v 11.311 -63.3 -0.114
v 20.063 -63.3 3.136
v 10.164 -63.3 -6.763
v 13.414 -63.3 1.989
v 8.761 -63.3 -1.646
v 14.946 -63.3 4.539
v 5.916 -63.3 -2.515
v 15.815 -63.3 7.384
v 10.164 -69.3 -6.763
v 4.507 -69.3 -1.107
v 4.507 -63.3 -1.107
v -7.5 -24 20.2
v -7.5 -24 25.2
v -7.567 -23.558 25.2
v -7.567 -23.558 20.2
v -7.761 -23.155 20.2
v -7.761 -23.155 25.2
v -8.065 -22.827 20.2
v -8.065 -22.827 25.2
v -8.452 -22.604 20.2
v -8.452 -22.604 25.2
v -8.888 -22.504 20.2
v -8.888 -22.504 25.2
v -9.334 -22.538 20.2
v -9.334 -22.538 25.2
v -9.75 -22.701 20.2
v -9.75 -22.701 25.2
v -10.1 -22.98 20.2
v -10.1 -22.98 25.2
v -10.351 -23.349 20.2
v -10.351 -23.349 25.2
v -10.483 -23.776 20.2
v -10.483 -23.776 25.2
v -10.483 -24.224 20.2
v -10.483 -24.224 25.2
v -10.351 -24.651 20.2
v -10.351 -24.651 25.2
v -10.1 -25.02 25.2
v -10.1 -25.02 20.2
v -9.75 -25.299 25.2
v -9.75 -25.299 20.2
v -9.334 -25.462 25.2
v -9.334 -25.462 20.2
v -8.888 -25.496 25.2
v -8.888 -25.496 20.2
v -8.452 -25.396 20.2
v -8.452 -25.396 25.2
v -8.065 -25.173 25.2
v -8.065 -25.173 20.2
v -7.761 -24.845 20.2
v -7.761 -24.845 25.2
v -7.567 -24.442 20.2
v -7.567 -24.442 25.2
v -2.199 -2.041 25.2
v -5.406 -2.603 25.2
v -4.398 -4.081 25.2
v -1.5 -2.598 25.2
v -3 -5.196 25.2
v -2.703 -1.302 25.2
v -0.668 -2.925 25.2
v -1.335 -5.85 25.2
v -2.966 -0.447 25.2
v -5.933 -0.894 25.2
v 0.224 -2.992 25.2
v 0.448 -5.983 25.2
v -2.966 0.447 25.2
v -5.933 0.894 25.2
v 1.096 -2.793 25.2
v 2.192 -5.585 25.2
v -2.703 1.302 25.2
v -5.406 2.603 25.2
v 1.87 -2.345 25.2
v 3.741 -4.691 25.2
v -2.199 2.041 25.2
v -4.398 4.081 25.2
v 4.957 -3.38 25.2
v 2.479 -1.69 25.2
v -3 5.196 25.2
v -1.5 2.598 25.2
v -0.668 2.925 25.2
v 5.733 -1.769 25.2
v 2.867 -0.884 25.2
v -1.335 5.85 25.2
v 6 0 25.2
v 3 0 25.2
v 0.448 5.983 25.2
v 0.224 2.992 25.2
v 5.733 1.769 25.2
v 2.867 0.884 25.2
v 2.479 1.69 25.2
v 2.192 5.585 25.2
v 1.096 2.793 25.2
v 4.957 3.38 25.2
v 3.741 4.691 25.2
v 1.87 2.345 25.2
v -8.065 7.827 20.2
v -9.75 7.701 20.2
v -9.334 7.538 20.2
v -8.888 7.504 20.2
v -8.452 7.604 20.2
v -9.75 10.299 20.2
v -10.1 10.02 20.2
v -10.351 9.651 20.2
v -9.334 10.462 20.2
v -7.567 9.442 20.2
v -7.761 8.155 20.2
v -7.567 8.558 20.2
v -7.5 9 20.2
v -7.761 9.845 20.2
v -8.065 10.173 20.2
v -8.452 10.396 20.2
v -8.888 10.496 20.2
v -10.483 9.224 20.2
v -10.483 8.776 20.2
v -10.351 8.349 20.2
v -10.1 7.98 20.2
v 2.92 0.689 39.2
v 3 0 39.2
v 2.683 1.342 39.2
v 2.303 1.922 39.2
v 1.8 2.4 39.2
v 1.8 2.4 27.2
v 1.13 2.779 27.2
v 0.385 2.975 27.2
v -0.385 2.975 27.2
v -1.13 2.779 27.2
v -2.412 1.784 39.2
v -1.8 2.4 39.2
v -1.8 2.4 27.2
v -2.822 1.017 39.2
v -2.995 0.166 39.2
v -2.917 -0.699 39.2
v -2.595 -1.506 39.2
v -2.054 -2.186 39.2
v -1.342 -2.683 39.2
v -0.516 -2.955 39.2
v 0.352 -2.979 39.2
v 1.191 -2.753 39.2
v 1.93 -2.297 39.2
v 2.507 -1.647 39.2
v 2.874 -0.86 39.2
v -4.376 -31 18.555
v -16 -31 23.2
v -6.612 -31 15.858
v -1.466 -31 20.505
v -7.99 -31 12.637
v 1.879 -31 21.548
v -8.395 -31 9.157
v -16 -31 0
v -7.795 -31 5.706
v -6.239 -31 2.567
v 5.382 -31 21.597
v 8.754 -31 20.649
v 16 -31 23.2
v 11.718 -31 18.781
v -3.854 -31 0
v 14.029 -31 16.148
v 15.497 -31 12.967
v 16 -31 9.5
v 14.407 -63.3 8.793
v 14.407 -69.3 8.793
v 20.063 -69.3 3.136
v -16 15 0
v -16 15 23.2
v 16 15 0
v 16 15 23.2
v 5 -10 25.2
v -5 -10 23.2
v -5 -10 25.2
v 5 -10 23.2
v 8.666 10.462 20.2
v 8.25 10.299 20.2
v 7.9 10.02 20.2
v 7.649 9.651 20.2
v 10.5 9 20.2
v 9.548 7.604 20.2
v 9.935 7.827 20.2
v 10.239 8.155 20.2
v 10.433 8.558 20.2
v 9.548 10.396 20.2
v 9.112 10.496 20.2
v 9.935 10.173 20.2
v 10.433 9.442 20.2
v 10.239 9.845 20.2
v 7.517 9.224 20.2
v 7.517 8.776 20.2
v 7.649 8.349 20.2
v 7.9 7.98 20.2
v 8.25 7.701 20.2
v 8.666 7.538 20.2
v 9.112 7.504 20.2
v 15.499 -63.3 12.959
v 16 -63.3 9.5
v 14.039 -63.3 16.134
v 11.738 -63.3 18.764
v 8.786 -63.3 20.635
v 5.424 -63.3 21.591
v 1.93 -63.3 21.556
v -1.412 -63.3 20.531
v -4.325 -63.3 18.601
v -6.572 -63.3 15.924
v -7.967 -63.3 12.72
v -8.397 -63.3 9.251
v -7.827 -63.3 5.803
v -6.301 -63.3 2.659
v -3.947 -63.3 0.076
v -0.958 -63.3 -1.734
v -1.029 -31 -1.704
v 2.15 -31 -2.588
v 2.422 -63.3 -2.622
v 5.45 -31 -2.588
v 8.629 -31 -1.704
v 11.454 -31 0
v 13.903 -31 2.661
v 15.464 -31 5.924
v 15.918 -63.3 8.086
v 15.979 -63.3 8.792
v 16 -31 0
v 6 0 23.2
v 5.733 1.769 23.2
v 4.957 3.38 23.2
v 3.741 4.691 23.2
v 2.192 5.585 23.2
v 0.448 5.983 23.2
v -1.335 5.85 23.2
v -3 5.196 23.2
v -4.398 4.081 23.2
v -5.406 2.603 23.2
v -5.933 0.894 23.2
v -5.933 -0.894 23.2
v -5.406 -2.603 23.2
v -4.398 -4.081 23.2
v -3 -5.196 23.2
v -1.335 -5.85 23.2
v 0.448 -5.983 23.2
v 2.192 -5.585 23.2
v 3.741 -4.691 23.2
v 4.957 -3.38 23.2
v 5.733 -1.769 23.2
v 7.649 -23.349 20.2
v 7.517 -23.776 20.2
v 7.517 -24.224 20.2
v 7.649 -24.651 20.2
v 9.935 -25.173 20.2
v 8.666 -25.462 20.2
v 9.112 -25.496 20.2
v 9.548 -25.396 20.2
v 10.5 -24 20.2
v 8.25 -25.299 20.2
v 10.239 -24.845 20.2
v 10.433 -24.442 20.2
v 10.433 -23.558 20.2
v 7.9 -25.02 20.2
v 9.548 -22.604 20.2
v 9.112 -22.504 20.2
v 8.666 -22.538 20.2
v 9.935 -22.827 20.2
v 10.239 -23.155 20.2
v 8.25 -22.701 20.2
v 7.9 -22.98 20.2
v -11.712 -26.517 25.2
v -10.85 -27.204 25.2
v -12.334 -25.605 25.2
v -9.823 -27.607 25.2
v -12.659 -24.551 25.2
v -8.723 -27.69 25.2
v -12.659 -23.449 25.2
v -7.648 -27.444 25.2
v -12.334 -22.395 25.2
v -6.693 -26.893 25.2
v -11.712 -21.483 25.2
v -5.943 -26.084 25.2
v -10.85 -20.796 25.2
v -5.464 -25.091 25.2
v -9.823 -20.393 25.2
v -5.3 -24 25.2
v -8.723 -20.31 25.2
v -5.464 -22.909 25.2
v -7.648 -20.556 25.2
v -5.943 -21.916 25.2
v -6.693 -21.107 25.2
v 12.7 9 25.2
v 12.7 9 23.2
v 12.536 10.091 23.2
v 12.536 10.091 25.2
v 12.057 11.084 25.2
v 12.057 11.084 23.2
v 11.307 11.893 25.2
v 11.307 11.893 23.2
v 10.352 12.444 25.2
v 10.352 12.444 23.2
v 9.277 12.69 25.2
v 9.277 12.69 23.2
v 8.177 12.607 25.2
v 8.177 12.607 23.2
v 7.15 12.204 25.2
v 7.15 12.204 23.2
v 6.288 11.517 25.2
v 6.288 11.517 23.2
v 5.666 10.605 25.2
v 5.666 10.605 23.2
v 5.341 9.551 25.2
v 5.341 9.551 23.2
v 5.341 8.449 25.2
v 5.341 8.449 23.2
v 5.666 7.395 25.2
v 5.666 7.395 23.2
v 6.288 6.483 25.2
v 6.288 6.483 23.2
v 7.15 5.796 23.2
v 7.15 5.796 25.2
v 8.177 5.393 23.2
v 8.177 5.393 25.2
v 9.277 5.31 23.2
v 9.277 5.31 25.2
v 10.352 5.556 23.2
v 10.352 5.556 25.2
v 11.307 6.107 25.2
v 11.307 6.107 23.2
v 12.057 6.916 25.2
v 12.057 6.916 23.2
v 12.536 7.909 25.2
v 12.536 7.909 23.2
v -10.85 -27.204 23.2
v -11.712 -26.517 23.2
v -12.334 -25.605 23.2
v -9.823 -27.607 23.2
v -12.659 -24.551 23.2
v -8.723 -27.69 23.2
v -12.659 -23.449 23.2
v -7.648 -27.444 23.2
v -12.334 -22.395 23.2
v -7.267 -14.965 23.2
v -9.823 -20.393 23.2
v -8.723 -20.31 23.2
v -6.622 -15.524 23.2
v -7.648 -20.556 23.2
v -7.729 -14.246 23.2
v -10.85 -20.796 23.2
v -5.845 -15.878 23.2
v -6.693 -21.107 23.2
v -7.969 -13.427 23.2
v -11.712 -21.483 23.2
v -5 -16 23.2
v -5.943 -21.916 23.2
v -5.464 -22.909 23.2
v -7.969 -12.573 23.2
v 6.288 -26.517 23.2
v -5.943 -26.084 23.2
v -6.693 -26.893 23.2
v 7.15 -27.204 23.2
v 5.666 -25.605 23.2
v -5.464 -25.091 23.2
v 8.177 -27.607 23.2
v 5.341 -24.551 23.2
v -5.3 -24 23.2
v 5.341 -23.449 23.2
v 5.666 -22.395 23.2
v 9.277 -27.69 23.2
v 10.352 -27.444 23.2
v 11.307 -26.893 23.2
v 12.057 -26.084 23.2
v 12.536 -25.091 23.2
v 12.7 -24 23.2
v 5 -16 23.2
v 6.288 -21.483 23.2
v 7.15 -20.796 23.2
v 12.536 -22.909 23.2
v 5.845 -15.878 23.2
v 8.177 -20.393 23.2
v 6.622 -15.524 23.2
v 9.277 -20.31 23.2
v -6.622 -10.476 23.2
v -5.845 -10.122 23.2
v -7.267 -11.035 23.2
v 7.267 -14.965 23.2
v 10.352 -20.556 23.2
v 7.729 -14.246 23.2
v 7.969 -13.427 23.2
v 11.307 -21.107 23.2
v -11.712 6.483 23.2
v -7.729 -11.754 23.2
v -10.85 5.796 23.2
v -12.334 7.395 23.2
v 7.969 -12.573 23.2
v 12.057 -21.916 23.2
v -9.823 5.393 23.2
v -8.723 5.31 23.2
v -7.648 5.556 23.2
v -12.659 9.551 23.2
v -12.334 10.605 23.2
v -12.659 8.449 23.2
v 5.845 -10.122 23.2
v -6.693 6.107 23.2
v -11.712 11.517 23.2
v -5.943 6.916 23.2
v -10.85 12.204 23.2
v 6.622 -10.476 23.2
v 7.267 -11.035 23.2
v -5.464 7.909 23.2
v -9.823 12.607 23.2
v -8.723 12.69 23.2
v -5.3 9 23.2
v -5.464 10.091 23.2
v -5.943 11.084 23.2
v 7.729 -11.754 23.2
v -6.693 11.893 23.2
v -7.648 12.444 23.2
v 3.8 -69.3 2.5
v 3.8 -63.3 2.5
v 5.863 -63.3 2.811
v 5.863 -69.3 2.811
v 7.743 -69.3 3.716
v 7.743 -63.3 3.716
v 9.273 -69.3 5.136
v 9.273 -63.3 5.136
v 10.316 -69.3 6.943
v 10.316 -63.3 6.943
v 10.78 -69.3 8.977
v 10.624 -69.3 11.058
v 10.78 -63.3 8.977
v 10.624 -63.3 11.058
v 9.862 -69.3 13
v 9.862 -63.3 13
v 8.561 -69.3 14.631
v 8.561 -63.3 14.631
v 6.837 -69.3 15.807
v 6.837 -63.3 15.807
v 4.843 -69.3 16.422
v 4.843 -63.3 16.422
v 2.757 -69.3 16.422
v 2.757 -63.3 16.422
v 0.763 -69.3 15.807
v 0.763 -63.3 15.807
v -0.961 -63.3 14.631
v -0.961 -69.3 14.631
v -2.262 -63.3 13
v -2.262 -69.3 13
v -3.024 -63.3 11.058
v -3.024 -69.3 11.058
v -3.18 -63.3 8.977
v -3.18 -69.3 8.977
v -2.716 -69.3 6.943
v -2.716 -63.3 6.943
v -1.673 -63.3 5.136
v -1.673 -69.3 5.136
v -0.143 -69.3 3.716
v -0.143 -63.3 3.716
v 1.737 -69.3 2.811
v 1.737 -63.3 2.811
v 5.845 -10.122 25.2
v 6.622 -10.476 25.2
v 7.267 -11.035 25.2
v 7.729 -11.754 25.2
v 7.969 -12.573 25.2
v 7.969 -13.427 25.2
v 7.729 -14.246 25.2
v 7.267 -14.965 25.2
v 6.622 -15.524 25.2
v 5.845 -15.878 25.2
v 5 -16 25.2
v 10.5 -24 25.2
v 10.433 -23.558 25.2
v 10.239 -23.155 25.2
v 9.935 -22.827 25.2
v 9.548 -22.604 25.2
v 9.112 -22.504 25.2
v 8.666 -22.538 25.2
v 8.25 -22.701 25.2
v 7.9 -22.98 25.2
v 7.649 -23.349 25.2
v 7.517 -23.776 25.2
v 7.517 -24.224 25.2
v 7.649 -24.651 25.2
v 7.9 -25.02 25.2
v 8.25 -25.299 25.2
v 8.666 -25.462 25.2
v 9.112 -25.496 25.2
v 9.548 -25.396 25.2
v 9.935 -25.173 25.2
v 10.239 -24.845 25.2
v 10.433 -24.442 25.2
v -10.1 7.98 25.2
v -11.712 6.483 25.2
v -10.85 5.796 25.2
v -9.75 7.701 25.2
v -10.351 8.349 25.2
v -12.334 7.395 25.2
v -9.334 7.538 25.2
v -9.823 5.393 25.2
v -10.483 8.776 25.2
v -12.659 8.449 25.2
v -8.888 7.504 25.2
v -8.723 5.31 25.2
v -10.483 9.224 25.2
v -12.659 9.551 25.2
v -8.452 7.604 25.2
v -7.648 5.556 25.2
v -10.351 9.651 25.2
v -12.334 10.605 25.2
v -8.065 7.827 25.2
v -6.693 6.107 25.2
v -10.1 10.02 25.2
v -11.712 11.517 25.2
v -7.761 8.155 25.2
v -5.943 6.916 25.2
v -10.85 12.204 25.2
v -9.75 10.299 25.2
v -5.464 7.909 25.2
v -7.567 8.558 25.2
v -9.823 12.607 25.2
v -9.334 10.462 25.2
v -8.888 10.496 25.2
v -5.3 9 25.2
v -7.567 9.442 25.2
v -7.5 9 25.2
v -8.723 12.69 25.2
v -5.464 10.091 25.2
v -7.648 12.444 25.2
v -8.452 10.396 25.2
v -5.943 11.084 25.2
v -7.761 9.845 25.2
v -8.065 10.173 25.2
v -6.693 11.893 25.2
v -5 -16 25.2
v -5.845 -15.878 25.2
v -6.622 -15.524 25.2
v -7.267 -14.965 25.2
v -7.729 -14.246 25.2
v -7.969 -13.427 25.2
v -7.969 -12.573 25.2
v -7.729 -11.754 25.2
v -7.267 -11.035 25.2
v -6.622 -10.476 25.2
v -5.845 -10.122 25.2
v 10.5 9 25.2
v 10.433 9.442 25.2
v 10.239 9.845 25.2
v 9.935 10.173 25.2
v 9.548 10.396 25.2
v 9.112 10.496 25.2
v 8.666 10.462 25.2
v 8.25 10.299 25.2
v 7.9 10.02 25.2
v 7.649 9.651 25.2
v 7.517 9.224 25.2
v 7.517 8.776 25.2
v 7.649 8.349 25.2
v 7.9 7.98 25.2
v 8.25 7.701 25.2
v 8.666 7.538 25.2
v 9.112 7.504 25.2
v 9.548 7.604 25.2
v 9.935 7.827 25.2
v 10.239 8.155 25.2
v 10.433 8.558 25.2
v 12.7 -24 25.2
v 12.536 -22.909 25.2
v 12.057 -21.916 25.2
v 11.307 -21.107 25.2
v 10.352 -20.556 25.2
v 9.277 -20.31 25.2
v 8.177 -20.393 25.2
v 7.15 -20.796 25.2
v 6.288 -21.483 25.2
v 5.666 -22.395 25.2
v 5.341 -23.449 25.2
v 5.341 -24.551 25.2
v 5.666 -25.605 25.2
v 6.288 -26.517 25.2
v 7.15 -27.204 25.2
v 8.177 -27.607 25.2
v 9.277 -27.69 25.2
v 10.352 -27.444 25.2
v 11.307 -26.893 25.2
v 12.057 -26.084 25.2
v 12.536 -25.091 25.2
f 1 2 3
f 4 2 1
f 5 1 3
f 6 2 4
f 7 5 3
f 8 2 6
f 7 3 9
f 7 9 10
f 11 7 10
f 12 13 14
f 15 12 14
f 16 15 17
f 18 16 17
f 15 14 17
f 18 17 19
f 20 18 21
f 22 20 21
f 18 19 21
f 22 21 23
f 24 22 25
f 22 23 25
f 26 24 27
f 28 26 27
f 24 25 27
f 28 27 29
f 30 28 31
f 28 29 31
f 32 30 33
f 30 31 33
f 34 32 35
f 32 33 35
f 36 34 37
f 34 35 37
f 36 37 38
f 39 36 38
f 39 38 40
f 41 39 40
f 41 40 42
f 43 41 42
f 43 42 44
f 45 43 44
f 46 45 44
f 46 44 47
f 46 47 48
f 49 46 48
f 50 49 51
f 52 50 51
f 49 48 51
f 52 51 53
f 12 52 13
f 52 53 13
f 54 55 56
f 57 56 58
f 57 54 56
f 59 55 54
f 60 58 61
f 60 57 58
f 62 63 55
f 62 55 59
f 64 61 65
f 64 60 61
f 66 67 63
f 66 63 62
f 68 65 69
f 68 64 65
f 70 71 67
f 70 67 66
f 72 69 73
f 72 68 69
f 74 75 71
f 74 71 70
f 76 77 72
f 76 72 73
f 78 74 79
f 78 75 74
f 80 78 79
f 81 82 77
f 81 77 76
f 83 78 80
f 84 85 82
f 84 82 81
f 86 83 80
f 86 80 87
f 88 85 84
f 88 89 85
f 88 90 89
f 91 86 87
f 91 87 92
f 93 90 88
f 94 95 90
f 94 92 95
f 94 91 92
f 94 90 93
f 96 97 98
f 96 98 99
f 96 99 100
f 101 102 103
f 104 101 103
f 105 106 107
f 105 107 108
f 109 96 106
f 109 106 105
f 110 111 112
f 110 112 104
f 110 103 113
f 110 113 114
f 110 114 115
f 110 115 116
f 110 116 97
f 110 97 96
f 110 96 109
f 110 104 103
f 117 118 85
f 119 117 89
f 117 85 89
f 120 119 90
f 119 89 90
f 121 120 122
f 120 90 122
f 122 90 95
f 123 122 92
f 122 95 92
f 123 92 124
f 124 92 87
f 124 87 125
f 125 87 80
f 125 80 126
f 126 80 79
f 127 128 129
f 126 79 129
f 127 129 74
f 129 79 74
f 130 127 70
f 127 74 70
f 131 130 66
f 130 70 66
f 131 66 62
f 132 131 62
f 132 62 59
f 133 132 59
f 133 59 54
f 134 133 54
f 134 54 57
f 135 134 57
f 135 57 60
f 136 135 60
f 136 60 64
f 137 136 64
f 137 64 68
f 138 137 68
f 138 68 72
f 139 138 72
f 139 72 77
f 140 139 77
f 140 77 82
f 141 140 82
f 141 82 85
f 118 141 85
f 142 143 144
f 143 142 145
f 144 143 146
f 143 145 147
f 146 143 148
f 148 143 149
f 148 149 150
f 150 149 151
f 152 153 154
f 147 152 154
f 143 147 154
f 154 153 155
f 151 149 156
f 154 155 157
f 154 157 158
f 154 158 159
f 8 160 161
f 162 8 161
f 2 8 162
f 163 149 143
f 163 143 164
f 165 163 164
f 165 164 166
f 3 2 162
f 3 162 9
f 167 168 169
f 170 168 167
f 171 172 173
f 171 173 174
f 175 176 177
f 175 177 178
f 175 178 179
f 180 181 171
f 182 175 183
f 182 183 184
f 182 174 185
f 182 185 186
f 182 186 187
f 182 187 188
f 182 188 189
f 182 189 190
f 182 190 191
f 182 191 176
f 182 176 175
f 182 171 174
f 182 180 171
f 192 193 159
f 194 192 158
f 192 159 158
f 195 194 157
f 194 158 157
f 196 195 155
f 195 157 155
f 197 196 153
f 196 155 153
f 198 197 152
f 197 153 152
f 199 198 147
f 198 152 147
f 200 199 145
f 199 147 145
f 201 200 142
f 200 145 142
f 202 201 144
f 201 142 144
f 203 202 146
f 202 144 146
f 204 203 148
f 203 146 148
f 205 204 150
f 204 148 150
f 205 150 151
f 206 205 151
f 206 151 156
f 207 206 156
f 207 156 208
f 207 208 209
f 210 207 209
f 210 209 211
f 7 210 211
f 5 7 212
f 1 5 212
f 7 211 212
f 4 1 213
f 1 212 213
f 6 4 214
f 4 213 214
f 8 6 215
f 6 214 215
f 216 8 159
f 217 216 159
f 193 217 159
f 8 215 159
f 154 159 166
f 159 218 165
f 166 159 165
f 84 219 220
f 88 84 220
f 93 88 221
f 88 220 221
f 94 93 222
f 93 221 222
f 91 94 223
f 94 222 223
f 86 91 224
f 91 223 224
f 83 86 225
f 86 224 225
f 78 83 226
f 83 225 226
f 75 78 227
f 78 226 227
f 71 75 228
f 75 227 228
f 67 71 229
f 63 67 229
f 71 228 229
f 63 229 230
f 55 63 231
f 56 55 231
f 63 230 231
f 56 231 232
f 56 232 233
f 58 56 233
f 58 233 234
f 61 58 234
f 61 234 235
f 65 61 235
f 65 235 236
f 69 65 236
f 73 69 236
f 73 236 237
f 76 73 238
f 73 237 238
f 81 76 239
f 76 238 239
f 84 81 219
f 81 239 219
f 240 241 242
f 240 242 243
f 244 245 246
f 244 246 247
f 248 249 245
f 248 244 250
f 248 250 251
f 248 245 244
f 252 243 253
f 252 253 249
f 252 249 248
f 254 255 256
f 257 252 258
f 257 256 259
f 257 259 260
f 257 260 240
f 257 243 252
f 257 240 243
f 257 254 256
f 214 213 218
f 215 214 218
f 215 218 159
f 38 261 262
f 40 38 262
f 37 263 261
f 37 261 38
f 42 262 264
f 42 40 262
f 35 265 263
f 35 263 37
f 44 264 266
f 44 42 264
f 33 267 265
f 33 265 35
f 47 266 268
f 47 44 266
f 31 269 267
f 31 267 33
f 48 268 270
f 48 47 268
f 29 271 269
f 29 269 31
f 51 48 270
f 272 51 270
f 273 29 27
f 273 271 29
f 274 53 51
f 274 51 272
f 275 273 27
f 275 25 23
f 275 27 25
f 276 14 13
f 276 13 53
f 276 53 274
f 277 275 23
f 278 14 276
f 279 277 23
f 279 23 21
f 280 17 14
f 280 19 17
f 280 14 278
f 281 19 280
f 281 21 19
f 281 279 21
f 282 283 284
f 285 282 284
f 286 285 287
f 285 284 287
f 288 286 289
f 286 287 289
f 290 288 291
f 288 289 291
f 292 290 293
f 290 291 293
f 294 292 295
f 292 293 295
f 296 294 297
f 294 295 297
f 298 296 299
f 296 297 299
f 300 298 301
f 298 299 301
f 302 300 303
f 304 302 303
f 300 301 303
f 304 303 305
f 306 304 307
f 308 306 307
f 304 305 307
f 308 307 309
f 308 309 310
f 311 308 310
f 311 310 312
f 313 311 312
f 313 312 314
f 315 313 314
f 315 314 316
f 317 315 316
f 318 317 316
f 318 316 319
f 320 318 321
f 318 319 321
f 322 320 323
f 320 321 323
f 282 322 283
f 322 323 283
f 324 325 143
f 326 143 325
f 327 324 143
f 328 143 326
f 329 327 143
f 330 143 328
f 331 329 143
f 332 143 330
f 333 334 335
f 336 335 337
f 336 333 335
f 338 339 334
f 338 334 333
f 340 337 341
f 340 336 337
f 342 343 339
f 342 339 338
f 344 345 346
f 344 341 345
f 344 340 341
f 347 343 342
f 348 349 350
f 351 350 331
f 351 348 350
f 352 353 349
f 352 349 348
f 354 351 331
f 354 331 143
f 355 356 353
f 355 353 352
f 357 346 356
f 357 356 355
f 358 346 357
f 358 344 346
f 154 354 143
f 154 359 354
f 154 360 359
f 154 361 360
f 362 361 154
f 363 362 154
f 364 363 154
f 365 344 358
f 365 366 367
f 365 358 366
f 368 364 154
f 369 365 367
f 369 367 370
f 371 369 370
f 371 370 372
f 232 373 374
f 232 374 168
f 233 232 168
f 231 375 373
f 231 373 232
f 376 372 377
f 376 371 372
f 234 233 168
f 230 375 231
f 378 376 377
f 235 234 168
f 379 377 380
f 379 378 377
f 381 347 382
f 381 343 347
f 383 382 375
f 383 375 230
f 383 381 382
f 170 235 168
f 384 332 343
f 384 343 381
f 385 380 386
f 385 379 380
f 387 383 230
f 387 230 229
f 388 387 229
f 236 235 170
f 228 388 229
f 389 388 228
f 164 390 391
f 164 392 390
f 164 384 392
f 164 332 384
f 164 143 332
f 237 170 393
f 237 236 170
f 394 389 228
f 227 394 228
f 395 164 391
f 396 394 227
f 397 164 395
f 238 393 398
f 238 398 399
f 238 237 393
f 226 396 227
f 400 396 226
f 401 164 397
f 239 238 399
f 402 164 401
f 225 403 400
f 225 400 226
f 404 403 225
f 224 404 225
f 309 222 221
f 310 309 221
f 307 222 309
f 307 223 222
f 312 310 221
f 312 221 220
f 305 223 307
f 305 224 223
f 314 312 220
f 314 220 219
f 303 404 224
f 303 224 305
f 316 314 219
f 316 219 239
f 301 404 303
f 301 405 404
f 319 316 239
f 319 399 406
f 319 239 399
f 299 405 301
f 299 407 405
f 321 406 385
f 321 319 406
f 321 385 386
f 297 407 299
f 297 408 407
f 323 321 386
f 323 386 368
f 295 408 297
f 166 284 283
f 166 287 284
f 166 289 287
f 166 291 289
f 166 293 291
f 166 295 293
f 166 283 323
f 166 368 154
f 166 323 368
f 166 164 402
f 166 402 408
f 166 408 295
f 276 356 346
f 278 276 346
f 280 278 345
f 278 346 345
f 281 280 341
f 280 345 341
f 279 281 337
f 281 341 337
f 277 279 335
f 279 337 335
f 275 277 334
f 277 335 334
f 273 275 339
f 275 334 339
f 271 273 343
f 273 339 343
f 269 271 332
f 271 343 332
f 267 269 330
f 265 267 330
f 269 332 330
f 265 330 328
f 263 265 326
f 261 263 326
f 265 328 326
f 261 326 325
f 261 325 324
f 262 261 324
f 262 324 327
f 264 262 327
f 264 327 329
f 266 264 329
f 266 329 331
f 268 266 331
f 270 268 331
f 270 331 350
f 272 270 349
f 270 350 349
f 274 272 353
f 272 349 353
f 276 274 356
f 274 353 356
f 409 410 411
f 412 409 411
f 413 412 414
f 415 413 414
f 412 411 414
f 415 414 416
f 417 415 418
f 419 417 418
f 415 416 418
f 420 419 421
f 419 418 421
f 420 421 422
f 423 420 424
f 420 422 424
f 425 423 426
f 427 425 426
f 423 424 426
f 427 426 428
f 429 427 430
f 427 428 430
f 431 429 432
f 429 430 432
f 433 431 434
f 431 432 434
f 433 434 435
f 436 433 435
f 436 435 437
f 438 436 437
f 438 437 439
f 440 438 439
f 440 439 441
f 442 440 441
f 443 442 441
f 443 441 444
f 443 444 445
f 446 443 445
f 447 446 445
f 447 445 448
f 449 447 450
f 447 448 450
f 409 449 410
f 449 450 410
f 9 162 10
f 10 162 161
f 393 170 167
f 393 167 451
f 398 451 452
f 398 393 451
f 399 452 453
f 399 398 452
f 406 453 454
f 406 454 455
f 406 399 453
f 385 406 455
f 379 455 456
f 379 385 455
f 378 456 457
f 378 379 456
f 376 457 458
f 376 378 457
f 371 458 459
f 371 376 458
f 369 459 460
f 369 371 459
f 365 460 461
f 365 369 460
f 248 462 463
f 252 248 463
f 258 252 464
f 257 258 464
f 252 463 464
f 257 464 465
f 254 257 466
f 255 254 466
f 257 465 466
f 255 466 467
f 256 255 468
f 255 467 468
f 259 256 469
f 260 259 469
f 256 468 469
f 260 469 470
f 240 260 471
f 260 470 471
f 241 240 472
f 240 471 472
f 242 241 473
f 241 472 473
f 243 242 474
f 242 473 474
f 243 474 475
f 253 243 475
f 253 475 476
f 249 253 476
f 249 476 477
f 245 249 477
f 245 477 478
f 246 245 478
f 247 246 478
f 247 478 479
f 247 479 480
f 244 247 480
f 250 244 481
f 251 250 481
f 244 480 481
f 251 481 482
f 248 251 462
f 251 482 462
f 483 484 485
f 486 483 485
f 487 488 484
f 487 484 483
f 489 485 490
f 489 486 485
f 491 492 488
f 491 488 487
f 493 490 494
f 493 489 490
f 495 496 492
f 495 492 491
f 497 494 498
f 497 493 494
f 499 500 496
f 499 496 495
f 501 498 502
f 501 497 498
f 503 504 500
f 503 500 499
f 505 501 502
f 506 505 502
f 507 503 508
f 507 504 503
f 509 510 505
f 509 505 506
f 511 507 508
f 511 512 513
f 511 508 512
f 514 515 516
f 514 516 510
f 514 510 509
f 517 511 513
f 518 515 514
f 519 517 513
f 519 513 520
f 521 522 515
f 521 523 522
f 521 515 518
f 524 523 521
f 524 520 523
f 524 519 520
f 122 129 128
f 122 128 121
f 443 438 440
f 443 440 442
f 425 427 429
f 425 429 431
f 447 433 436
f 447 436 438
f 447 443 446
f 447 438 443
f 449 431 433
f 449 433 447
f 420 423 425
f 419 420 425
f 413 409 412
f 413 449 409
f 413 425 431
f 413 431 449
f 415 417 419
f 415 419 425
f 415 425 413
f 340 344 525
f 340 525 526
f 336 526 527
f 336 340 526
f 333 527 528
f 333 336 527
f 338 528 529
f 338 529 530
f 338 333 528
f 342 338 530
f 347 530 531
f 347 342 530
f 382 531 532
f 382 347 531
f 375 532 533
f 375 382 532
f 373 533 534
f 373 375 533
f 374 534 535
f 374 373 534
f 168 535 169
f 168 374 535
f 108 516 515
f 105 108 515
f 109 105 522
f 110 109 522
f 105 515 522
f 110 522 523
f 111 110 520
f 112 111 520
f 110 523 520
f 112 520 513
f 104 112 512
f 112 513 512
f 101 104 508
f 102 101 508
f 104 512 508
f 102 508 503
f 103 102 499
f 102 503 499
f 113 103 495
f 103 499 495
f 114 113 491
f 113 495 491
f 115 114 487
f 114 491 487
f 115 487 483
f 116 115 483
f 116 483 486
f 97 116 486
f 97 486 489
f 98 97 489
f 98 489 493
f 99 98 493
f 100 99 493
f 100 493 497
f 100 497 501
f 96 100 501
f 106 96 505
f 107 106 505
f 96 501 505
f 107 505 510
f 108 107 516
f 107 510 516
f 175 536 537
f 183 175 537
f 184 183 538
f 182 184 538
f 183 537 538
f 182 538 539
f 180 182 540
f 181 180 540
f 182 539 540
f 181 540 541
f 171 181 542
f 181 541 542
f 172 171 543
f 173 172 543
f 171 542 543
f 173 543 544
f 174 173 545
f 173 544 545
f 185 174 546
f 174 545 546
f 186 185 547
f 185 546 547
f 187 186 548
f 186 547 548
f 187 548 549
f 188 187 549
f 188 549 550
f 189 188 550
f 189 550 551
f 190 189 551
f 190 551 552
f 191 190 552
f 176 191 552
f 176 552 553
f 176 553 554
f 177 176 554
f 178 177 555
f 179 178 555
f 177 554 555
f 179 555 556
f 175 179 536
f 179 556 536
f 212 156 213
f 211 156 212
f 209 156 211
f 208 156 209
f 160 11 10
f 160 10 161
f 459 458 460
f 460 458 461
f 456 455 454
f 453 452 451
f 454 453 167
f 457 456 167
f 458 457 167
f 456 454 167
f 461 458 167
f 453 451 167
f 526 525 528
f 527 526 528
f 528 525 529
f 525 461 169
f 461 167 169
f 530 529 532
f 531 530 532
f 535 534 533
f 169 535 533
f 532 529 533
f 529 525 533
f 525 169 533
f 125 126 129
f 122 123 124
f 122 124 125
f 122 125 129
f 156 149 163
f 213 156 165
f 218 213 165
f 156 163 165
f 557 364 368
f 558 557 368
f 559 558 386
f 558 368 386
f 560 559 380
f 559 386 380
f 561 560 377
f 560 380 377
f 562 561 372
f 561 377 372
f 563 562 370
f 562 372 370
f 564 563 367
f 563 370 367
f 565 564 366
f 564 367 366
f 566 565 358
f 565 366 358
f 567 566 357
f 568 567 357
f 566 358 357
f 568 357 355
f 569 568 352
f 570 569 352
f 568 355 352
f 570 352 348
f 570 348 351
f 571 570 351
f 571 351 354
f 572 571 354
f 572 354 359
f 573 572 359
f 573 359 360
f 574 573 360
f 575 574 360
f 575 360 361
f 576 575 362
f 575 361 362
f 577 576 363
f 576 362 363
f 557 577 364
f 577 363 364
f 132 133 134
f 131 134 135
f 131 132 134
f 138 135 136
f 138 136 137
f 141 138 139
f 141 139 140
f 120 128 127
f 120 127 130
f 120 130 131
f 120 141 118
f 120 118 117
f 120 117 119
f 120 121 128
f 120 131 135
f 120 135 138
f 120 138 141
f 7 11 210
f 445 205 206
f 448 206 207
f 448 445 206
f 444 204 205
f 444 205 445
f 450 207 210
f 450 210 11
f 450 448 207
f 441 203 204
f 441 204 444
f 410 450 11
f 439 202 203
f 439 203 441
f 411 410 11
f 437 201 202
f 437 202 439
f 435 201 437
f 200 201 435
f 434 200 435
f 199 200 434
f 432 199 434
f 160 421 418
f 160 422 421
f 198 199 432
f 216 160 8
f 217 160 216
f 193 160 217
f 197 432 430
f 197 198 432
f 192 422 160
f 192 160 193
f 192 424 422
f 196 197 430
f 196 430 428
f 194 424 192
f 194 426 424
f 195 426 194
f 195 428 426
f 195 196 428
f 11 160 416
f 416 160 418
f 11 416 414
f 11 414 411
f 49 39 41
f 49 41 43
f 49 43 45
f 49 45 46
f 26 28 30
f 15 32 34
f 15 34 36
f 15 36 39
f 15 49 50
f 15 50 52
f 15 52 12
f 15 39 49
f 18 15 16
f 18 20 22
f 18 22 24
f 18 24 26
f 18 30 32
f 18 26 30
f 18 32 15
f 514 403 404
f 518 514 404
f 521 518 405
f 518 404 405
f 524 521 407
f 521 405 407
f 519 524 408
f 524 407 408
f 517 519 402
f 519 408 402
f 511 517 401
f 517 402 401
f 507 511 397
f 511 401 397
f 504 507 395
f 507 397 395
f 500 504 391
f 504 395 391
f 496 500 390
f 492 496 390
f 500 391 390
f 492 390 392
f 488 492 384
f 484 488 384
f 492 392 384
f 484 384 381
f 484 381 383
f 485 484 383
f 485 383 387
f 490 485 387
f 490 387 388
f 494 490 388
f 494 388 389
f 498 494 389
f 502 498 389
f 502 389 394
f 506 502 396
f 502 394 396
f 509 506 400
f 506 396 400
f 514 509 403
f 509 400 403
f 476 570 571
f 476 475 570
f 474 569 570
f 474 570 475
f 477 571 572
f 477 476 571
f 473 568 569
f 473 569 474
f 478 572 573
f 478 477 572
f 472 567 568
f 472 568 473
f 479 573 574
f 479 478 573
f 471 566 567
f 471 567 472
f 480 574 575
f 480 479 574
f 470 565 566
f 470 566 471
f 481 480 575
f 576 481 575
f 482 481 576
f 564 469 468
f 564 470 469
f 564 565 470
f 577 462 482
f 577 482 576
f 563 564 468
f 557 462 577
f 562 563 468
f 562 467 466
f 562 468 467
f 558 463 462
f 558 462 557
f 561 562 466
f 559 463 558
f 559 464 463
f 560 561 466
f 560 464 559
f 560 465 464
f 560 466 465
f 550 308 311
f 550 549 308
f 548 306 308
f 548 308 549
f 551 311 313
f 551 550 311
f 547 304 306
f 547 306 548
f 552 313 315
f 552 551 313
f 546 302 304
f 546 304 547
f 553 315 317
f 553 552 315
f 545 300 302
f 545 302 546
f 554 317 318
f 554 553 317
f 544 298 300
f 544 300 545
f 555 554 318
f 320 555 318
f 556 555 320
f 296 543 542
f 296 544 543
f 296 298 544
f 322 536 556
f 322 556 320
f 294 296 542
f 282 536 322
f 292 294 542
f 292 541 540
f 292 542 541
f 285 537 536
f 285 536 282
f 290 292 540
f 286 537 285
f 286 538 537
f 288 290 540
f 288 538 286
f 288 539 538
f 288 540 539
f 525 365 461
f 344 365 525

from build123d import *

# Parameters (mm, degrees)
SKETCH_372_W           = 32
SKETCH_372_H           = 46
EXTRUDE_487_DEPTH      = 23.2
SKETCH_1_R             = 12.2
EXTRUDE_677_DEPTH      = 30.8
SKETCH_726_R           = 3.7
EXTRUDE_1207_DEPTH     = 2
SKETCH_904_R           = 6
EXTRUDE_1247_DEPTH     = 2
EXTRUDE_1287_DEPTH     = 2
SKETCH_6_R             = 3
EXTRUDE_1383_DEPTH     = 14
CUT_EXTRUDE_START      = -12
CUT_EXTRUDE_1539_DEPTH = 12
SKETCH_1587_R          = 1.5
CUT_EXTRUDE_1690_DEPTH = 5
SKETCH_1732_R          = 12.2
EXTRUDE_1777_DEPTH     = 1.5
SKETCH_10_R            = 7
EXTRUDE_1879_DEPTH     = 6
EXTRUDE_2129_DEPTH     = 6


with BuildPart() as part:
    # Sketch 372 → Extrude 487 (new body)
    with BuildSketch(Plane.XY):
        with Locations((0, -8)):
            Rectangle(SKETCH_372_W, SKETCH_372_H)
    extrude(amount=EXTRUDE_487_DEPTH)

    # Эскиз1 → Extrude 677 (add)
    with BuildSketch(Plane.XZ.offset(31)):
        with Locations((3.8, 9.5)):
            Circle(SKETCH_1_R)
    extrude(amount=EXTRUDE_677_DEPTH)

    # Sketch 726 → Extrude 1207 (add)
    with BuildSketch(Plane.XY.offset(23.2)):
        with Locations((-9, 9)):
            Circle(SKETCH_726_R)
        with Locations((9, 9)):
            Circle(SKETCH_726_R)
        with Locations((9, -24)):
            Circle(SKETCH_726_R)
        with Locations((-9, -24)):
            Circle(SKETCH_726_R)
    extrude(amount=EXTRUDE_1207_DEPTH)

    # Sketch 904 → Extrude 1247 (add)
    with BuildSketch(Plane.XY.offset(23.2)):
        Circle(SKETCH_904_R)
    extrude(amount=EXTRUDE_1247_DEPTH)

    # Sketch 1024 → Extrude 1287 (add)
    with BuildSketch(Plane.XY.offset(23.2)):
        with BuildLine():
            Line((-5, -10), (5, -10))
            ThreePointArc((5, -10), (8, -13), (5, -16))
            Line((5, -16), (-5, -16))
            ThreePointArc((-5, -16), (-8, -13), (-5, -10))
        make_face()
    extrude(amount=EXTRUDE_1287_DEPTH)

    # Эскиз6 → Extrude 1383 (add)
    with BuildSketch(Plane.XY.offset(25.2)):
        Circle(SKETCH_6_R)
    extrude(amount=EXTRUDE_1383_DEPTH)

    # d-вал → Cut-Extrude 1539 (cut)
    with BuildSketch(Plane.XY.offset(39.2).offset(CUT_EXTRUDE_START)):
        with BuildLine():
            Line((-1.8, 2.4), (1.8, 2.4))
            ThreePointArc((1.8, 2.4), (0, 3), (-1.8, 2.4))
        make_face()
    extrude(amount=CUT_EXTRUDE_1539_DEPTH, mode=Mode.SUBTRACT)

    # Sketch 1587 → Cut-Extrude 1690 (cut)
    with BuildSketch(Plane.XY.offset(25.2)):
        with Locations((9, 9)):
            Circle(SKETCH_1587_R)
        with Locations((9, -24)):
            Circle(SKETCH_1587_R)
        with Locations((-9, 9)):
            Circle(SKETCH_1587_R)
        with Locations((-9, -24)):
            Circle(SKETCH_1587_R)
    extrude(amount=-CUT_EXTRUDE_1690_DEPTH, mode=Mode.SUBTRACT)

    # Sketch 1732 → Extrude 1777 (add)
    with BuildSketch(Plane.XZ.offset(61.8)):
        with Locations((3.8, 9.5)):
            Circle(SKETCH_1732_R)
    extrude(amount=EXTRUDE_1777_DEPTH)

    # Эскиз10 → Extrude 1879 (add)
    with BuildSketch(Plane.XZ.offset(63.3)):
        with Locations(Location((3.8, 9.5, 0), (0, 0, 270))):
            Circle(SKETCH_10_R)
    extrude(amount=EXTRUDE_1879_DEPTH)

    # Sketch 1921 → Extrude 2129 (add)
    with BuildSketch(Plane.XZ.offset(63.3)):
        Polygon((14.406601718, 8.792893219), (20.063455967, 3.136038969), (10.163961031, -6.763455967), (4.507106781, -1.106601718), align=None)
    extrude(amount=EXTRUDE_2129_DEPTH)


solid = part.part
